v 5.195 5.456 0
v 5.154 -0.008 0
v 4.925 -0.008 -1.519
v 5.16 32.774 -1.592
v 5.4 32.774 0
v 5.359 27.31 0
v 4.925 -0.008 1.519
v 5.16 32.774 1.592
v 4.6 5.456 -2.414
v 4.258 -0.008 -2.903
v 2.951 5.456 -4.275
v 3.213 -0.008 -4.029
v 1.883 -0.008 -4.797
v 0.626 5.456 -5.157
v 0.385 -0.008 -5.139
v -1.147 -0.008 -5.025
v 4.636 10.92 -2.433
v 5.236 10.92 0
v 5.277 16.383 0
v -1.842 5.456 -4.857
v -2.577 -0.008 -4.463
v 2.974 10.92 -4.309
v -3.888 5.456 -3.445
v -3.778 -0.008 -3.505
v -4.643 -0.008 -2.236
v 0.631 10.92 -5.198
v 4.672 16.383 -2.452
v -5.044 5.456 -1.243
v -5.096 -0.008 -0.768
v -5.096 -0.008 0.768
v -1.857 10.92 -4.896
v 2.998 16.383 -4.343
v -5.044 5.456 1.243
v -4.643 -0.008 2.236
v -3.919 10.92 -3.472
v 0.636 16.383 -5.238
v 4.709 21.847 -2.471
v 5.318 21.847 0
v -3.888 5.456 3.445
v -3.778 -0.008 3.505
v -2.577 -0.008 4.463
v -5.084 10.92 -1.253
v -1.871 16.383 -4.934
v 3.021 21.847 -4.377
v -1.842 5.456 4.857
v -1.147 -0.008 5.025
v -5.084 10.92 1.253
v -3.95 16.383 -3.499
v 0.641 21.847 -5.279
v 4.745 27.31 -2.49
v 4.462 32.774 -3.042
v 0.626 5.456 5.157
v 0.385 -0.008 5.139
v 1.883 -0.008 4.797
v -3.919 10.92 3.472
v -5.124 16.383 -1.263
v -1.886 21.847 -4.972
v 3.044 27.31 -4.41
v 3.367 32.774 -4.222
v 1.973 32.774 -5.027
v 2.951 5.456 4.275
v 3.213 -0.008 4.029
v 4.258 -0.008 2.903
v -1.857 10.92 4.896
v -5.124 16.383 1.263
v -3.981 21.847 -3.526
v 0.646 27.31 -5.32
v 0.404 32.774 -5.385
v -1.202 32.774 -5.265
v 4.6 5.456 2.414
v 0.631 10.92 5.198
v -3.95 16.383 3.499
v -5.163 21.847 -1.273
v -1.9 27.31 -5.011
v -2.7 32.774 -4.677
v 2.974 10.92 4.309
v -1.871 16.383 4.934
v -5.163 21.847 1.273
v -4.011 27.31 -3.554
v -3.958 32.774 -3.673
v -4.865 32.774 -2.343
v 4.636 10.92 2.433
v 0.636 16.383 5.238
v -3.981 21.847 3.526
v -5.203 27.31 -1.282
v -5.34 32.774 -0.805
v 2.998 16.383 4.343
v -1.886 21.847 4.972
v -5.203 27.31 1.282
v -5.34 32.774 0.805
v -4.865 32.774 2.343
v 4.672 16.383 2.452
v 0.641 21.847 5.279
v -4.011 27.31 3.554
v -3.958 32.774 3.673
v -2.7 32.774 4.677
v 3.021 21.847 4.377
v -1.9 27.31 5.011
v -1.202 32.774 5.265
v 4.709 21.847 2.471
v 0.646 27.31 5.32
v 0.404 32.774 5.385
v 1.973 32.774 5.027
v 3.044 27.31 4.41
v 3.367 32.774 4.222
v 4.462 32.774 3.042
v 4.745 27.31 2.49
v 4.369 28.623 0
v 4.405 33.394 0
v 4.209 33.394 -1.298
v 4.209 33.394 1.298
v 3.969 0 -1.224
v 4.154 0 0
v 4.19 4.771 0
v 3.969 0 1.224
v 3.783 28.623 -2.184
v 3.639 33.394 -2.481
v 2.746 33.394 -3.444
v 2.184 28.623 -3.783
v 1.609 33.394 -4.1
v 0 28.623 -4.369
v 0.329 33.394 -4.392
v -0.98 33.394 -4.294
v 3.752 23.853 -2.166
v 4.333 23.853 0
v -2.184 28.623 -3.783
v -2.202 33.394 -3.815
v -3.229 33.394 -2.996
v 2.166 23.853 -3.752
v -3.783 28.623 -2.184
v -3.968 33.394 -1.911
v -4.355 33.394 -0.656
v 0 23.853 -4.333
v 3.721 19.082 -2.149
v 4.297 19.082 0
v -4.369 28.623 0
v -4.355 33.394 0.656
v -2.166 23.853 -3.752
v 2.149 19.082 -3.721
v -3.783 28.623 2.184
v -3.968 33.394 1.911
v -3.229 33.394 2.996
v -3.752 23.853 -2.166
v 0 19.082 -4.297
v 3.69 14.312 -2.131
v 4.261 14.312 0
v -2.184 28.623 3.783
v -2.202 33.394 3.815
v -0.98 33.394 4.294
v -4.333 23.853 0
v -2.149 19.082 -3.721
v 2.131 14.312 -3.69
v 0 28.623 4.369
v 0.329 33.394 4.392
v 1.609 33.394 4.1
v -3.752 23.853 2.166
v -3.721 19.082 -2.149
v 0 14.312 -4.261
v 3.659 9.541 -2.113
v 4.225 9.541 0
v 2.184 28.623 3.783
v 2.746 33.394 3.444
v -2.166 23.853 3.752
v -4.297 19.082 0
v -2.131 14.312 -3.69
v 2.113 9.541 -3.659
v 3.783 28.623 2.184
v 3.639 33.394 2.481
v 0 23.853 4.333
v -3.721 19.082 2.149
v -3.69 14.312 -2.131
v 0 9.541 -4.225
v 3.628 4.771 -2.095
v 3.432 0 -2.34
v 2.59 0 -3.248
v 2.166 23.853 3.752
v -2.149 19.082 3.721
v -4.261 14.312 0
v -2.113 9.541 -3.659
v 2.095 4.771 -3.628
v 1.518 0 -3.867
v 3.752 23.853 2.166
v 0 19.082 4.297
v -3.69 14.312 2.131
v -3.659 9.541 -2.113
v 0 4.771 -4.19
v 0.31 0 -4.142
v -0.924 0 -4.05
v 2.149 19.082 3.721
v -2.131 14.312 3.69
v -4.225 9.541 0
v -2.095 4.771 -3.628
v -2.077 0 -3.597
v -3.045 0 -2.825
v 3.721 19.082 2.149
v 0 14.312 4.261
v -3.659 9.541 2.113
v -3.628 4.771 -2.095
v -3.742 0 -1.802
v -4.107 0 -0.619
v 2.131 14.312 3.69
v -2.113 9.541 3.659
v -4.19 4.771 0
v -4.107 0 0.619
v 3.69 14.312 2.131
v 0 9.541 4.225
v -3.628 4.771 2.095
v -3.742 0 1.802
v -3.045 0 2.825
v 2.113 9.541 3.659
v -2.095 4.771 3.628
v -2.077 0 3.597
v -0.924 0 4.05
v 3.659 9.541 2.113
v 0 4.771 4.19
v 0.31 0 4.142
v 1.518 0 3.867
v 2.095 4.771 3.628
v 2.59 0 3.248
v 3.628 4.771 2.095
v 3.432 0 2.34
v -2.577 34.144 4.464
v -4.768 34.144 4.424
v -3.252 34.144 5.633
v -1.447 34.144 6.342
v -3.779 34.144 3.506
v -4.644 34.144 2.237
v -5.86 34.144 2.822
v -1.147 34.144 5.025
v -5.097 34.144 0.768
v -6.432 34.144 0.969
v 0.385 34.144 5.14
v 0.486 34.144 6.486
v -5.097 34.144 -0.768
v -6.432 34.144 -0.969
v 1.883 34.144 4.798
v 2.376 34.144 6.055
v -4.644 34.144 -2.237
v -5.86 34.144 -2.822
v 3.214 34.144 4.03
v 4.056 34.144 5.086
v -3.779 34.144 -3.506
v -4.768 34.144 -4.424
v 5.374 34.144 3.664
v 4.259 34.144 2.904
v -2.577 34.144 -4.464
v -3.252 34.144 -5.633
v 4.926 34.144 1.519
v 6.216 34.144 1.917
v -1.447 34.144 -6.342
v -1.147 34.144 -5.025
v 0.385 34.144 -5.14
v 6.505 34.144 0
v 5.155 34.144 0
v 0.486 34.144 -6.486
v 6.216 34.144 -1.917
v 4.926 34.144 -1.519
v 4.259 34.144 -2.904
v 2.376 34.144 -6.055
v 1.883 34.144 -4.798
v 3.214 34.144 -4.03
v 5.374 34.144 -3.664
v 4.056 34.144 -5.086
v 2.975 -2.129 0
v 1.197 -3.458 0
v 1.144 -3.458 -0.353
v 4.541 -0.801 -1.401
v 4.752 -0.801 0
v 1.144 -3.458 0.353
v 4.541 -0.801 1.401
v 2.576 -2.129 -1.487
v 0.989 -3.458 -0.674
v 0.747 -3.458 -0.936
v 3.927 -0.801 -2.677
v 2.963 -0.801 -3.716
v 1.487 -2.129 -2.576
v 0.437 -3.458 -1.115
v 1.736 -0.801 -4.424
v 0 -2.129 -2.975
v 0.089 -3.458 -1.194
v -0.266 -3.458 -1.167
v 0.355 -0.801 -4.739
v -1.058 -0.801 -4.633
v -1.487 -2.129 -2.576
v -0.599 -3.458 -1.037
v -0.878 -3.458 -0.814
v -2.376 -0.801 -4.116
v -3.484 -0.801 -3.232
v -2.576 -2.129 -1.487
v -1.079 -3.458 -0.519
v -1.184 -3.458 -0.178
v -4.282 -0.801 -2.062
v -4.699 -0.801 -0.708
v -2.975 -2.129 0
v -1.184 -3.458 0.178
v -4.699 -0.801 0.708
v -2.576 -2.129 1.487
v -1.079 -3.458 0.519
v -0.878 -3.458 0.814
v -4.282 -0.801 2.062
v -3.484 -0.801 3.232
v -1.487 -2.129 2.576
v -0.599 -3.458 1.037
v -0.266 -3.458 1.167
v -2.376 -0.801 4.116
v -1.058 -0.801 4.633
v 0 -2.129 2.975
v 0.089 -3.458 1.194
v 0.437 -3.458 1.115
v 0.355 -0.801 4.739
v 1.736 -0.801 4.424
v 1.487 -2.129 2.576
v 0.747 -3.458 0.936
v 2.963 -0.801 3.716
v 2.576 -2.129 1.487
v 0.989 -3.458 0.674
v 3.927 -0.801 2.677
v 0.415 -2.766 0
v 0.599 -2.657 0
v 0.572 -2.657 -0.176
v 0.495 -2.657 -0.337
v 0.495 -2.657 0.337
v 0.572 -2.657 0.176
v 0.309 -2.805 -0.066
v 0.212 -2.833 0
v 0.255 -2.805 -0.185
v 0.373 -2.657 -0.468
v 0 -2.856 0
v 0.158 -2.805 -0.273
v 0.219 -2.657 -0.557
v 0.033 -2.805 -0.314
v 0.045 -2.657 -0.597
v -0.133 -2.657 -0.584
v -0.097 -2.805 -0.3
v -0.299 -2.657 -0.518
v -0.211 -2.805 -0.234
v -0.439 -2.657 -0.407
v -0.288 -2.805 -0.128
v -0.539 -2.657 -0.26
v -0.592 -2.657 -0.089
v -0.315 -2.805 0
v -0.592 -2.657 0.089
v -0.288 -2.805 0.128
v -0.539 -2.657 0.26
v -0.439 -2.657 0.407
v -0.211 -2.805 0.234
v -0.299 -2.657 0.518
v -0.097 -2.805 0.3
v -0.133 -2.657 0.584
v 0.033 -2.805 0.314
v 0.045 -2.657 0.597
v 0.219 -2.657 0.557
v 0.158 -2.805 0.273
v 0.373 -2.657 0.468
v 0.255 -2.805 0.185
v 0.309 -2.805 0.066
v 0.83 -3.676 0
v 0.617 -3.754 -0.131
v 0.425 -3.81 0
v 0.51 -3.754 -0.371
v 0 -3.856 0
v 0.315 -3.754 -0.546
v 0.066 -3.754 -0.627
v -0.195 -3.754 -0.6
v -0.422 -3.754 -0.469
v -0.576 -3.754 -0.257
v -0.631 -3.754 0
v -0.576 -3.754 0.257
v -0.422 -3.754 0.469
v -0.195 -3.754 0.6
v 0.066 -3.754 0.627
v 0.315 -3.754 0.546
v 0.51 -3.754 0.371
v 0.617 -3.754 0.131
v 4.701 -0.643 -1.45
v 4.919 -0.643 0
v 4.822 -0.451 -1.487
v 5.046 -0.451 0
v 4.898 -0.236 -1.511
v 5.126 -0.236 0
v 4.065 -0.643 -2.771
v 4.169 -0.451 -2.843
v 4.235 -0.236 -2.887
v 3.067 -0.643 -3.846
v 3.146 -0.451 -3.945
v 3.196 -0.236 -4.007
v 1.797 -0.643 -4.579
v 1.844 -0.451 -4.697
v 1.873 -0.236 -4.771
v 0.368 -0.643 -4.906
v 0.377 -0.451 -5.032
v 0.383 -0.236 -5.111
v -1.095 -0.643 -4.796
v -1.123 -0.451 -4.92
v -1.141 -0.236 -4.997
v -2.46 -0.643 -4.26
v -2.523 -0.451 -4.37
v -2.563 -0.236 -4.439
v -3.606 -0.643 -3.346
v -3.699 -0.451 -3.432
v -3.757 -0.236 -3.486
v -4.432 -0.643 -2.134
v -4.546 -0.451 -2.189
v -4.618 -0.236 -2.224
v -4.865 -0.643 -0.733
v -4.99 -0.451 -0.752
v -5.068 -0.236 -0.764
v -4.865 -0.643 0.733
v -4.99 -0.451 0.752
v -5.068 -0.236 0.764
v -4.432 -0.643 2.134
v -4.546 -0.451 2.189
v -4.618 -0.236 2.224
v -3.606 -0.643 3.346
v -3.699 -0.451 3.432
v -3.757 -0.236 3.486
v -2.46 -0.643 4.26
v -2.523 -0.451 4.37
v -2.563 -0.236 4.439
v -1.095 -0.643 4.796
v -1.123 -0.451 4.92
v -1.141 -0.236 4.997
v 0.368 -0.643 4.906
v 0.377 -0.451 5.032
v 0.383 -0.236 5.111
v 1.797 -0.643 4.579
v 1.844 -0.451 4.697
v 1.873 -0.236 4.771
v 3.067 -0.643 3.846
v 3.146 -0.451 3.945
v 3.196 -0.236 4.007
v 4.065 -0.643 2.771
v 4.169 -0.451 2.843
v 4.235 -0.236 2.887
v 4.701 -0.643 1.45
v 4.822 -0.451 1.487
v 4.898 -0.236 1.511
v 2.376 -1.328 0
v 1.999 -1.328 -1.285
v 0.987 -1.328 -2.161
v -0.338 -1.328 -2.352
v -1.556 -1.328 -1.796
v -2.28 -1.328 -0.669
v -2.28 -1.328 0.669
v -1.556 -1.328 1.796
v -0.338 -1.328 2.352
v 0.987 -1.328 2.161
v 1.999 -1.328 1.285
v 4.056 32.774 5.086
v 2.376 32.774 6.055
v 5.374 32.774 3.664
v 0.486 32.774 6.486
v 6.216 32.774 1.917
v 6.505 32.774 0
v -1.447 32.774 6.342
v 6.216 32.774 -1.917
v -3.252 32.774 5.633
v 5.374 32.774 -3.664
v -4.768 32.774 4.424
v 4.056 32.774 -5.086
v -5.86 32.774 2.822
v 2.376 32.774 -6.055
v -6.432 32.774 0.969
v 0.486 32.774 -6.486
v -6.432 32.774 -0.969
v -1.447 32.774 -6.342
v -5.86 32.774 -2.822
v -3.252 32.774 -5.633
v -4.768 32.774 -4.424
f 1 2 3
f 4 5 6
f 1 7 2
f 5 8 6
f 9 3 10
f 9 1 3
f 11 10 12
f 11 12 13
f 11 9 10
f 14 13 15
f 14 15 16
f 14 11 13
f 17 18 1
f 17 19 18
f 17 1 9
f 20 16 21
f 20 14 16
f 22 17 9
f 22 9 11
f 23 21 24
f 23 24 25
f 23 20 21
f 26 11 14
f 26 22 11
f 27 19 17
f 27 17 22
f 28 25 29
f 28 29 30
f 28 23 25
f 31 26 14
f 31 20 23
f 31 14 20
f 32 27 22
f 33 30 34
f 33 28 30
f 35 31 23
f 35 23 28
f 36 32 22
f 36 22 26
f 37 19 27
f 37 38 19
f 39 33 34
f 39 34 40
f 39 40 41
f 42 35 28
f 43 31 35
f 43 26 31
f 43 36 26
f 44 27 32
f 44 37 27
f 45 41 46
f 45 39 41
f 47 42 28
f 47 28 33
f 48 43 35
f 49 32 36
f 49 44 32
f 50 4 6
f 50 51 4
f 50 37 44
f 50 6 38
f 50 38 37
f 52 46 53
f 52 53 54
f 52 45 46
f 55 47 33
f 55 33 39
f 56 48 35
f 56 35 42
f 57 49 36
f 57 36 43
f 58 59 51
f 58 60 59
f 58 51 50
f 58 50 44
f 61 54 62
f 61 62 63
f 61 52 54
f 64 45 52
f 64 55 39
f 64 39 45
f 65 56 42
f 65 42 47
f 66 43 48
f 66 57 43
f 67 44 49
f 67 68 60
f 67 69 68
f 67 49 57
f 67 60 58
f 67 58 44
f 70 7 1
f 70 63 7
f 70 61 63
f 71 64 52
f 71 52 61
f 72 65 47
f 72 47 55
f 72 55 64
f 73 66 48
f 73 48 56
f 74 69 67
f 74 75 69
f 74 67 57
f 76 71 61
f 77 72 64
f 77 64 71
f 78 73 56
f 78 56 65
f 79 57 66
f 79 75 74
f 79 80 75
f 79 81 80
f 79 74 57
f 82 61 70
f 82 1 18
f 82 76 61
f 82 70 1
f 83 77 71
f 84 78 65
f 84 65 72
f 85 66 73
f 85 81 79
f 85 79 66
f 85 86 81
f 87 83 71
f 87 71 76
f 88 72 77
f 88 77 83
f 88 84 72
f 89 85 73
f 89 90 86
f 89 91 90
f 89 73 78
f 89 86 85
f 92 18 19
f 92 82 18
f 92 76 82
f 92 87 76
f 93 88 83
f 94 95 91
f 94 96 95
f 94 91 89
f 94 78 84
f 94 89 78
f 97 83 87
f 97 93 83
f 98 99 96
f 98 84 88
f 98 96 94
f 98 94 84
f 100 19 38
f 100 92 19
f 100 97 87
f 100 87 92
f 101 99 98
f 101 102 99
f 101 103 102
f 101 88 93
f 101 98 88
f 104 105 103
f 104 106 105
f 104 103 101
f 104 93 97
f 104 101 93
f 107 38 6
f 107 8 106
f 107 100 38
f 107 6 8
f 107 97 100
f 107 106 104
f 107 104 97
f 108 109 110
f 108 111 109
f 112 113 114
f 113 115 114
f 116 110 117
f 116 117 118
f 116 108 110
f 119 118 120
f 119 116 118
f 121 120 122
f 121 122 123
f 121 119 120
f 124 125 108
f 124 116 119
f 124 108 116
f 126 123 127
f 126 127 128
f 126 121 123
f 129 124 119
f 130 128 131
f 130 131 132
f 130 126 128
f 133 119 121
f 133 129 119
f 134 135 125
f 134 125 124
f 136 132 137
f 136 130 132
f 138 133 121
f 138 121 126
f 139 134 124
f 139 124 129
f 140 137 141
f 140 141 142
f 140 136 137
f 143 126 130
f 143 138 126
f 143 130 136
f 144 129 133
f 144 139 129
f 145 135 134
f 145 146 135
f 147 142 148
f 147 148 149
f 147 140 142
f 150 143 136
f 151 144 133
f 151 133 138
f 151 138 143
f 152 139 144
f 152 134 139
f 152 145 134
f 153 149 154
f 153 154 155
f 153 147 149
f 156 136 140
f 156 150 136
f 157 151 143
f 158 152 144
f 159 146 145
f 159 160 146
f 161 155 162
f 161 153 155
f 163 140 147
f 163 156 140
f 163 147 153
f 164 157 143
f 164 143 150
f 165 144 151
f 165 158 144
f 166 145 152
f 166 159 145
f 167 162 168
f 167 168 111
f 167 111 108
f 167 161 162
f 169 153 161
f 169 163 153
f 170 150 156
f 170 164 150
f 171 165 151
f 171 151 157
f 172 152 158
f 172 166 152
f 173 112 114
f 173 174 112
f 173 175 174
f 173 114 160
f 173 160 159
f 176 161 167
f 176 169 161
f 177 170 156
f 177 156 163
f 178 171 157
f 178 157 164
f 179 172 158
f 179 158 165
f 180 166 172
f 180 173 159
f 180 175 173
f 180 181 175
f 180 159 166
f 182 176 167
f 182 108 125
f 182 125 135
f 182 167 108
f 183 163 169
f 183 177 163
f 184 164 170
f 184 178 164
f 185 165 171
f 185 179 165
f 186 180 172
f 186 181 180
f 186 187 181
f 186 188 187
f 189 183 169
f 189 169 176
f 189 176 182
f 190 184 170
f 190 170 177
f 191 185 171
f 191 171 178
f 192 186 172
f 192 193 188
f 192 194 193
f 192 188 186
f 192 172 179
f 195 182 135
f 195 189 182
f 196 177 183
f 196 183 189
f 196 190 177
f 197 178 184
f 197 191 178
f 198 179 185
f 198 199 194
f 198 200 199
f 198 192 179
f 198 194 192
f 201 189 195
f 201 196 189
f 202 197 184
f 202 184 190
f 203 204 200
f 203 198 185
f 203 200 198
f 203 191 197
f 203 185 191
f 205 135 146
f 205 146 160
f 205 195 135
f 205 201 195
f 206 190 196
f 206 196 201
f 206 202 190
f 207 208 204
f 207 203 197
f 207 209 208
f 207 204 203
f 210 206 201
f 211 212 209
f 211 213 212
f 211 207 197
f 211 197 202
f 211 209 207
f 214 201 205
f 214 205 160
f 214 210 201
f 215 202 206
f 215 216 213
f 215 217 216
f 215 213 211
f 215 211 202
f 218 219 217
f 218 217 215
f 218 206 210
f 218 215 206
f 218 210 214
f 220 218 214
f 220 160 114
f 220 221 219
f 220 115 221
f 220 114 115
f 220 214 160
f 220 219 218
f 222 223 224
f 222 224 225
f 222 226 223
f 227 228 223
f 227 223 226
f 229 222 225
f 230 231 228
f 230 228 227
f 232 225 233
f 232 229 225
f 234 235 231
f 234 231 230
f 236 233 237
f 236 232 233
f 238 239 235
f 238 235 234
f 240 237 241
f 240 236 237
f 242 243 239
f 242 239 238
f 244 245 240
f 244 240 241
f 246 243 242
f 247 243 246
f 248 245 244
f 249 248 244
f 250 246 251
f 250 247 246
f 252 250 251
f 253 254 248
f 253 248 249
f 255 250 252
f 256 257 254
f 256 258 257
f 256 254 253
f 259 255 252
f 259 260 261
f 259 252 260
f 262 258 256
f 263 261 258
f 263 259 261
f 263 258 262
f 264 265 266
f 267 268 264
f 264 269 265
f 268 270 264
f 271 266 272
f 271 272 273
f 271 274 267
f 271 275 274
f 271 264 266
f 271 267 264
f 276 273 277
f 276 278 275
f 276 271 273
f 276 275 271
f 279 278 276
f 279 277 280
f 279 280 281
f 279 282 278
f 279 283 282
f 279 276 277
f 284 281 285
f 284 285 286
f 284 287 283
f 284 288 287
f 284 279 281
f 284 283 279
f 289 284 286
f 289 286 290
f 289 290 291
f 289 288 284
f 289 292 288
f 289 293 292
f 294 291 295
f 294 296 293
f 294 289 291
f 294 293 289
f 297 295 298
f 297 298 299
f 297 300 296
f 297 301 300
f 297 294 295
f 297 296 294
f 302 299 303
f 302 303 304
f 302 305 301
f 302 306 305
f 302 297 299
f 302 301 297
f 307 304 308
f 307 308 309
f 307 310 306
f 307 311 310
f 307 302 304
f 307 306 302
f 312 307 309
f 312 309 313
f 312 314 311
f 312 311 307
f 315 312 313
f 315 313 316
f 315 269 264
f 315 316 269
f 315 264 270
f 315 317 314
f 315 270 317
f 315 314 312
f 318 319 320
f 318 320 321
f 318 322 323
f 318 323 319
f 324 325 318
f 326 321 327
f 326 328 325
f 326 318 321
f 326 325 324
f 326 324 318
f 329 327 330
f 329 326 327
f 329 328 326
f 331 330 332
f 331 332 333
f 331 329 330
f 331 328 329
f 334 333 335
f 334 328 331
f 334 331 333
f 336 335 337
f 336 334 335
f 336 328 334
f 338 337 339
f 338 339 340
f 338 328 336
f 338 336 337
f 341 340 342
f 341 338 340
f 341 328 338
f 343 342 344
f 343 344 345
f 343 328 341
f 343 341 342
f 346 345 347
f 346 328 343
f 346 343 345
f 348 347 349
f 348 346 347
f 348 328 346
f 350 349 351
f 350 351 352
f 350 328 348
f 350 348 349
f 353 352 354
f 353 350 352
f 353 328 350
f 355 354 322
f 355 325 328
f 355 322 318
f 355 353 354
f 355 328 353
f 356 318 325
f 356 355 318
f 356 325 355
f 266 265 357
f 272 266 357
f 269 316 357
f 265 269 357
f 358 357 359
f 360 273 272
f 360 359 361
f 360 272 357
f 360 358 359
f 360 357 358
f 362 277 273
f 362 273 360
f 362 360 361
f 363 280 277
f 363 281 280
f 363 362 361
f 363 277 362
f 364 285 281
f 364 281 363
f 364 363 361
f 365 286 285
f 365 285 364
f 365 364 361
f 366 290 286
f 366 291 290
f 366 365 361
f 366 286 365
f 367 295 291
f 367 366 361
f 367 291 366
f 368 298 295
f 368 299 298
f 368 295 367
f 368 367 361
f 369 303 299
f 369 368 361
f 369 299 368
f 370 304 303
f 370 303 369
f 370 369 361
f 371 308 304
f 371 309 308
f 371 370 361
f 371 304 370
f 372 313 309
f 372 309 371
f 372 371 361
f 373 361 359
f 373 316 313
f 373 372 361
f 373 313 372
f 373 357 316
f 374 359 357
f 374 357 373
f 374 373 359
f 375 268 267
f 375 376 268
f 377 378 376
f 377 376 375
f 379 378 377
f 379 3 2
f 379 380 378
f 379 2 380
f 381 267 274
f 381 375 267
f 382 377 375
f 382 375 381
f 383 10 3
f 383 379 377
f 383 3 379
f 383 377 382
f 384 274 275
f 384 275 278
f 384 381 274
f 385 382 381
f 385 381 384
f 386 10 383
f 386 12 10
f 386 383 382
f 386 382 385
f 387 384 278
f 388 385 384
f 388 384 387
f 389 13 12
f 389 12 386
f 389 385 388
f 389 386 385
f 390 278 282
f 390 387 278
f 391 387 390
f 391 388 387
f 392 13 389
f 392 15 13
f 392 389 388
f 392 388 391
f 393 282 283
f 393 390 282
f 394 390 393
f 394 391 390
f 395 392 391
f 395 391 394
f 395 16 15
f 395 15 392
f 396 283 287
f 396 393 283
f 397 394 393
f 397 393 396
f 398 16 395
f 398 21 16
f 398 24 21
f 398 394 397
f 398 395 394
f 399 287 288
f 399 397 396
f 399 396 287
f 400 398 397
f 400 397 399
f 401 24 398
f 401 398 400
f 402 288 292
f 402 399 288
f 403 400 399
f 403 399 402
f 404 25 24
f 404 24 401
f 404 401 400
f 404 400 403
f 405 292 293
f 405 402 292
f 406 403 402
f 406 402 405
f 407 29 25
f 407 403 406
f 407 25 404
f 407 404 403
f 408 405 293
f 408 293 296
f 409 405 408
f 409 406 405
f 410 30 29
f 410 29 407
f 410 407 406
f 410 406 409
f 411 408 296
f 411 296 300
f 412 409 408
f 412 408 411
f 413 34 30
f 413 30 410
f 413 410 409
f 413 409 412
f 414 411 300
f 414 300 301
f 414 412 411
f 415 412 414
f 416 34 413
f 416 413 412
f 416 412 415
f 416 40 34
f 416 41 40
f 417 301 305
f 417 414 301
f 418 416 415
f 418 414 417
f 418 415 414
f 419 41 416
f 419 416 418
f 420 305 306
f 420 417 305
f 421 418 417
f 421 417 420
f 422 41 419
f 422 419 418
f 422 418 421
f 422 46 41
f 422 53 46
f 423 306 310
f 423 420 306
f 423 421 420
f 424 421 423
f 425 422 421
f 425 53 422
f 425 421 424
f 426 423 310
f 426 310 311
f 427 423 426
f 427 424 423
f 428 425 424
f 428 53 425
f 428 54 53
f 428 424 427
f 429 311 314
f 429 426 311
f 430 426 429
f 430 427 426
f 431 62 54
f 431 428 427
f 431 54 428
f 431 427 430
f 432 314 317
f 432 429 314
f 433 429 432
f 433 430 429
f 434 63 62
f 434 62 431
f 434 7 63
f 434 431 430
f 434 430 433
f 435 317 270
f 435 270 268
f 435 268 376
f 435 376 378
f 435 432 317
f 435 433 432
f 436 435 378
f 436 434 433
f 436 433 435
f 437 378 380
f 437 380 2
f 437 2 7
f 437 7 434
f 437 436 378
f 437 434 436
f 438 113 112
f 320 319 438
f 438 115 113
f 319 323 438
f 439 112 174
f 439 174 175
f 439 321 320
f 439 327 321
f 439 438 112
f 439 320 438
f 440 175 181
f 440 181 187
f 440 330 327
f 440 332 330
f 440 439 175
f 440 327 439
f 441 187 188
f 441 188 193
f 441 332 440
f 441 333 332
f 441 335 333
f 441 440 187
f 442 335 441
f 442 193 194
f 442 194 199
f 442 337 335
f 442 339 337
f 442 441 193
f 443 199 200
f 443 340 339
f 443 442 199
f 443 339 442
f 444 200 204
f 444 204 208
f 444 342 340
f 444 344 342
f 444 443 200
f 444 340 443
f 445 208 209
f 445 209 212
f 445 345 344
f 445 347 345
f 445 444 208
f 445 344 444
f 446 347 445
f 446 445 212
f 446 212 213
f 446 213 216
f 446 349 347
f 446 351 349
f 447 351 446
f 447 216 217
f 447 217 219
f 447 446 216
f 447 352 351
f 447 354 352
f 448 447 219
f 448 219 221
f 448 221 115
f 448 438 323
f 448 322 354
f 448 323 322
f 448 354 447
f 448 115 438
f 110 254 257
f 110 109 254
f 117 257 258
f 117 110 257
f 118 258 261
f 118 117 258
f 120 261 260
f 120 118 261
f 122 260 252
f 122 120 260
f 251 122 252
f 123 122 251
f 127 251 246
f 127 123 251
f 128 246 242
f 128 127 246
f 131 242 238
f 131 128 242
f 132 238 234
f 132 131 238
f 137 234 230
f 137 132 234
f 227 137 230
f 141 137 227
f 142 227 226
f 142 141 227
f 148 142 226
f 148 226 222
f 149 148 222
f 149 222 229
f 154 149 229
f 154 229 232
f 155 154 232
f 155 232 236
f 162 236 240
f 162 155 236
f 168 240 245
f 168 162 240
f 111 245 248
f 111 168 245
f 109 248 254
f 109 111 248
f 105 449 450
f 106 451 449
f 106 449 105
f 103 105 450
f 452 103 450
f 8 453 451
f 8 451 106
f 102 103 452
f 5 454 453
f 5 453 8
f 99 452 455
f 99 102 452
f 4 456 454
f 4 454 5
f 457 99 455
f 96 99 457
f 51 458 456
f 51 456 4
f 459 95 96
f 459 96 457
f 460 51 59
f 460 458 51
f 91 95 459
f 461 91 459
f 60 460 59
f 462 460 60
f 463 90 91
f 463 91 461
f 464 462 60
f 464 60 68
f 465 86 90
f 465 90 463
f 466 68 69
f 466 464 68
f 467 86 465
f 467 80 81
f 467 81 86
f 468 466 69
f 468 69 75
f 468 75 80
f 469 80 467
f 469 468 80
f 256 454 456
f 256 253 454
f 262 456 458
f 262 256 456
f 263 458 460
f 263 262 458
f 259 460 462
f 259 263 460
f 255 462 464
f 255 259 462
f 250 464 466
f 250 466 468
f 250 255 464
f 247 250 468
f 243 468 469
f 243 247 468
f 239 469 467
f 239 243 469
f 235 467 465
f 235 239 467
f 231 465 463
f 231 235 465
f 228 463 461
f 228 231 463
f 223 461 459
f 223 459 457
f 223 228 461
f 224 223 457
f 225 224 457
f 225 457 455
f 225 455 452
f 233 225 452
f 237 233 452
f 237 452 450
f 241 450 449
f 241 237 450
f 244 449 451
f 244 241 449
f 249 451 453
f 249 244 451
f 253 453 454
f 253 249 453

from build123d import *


with BuildPart() as part:
    # Sketch1 → Revolve1 (revolve)
    with BuildSketch(Plane.XY):
        with BuildLine():
            Line((1.197299905, -3.457984677), (4.752406997, -0.801010758))
            ThreePointArc((4.752406997, -0.801010758), (5.046117858, -0.451322699), (5.153728827, -0.007512281))
            Line((5.153728827, -0.007512281), (5.4, 32.774036839))
            Line((5.4, 32.774036839), (6.504629528, 32.774036839))
            Line((6.504629528, 32.774036839), (6.504629528, 34.144036839))
            Line((6.504629528, 34.144036839), (5.154629528, 34.144036839))
            Line((5.154629528, 34.144036839), (4.404629528, 33.394036839))
            Line((4.404629528, 33.394036839), (4.153757045, 0))
            Line((4.153757045, 0), (0.598649953, -2.656973919))
            ThreePointArc((0.598649953, -2.656973919), (0.31542768, -2.80491278), (0, -2.855963161))
            Line((0, -2.855963161), (0, -3.855963161))
            ThreePointArc((0, -3.855963161), (0.630855359, -3.753862399), (1.197299905, -3.457984677))
        make_face()
    revolve(axis=Axis((0, 0, 0), (0, 1, 0)))


solid = part.part
